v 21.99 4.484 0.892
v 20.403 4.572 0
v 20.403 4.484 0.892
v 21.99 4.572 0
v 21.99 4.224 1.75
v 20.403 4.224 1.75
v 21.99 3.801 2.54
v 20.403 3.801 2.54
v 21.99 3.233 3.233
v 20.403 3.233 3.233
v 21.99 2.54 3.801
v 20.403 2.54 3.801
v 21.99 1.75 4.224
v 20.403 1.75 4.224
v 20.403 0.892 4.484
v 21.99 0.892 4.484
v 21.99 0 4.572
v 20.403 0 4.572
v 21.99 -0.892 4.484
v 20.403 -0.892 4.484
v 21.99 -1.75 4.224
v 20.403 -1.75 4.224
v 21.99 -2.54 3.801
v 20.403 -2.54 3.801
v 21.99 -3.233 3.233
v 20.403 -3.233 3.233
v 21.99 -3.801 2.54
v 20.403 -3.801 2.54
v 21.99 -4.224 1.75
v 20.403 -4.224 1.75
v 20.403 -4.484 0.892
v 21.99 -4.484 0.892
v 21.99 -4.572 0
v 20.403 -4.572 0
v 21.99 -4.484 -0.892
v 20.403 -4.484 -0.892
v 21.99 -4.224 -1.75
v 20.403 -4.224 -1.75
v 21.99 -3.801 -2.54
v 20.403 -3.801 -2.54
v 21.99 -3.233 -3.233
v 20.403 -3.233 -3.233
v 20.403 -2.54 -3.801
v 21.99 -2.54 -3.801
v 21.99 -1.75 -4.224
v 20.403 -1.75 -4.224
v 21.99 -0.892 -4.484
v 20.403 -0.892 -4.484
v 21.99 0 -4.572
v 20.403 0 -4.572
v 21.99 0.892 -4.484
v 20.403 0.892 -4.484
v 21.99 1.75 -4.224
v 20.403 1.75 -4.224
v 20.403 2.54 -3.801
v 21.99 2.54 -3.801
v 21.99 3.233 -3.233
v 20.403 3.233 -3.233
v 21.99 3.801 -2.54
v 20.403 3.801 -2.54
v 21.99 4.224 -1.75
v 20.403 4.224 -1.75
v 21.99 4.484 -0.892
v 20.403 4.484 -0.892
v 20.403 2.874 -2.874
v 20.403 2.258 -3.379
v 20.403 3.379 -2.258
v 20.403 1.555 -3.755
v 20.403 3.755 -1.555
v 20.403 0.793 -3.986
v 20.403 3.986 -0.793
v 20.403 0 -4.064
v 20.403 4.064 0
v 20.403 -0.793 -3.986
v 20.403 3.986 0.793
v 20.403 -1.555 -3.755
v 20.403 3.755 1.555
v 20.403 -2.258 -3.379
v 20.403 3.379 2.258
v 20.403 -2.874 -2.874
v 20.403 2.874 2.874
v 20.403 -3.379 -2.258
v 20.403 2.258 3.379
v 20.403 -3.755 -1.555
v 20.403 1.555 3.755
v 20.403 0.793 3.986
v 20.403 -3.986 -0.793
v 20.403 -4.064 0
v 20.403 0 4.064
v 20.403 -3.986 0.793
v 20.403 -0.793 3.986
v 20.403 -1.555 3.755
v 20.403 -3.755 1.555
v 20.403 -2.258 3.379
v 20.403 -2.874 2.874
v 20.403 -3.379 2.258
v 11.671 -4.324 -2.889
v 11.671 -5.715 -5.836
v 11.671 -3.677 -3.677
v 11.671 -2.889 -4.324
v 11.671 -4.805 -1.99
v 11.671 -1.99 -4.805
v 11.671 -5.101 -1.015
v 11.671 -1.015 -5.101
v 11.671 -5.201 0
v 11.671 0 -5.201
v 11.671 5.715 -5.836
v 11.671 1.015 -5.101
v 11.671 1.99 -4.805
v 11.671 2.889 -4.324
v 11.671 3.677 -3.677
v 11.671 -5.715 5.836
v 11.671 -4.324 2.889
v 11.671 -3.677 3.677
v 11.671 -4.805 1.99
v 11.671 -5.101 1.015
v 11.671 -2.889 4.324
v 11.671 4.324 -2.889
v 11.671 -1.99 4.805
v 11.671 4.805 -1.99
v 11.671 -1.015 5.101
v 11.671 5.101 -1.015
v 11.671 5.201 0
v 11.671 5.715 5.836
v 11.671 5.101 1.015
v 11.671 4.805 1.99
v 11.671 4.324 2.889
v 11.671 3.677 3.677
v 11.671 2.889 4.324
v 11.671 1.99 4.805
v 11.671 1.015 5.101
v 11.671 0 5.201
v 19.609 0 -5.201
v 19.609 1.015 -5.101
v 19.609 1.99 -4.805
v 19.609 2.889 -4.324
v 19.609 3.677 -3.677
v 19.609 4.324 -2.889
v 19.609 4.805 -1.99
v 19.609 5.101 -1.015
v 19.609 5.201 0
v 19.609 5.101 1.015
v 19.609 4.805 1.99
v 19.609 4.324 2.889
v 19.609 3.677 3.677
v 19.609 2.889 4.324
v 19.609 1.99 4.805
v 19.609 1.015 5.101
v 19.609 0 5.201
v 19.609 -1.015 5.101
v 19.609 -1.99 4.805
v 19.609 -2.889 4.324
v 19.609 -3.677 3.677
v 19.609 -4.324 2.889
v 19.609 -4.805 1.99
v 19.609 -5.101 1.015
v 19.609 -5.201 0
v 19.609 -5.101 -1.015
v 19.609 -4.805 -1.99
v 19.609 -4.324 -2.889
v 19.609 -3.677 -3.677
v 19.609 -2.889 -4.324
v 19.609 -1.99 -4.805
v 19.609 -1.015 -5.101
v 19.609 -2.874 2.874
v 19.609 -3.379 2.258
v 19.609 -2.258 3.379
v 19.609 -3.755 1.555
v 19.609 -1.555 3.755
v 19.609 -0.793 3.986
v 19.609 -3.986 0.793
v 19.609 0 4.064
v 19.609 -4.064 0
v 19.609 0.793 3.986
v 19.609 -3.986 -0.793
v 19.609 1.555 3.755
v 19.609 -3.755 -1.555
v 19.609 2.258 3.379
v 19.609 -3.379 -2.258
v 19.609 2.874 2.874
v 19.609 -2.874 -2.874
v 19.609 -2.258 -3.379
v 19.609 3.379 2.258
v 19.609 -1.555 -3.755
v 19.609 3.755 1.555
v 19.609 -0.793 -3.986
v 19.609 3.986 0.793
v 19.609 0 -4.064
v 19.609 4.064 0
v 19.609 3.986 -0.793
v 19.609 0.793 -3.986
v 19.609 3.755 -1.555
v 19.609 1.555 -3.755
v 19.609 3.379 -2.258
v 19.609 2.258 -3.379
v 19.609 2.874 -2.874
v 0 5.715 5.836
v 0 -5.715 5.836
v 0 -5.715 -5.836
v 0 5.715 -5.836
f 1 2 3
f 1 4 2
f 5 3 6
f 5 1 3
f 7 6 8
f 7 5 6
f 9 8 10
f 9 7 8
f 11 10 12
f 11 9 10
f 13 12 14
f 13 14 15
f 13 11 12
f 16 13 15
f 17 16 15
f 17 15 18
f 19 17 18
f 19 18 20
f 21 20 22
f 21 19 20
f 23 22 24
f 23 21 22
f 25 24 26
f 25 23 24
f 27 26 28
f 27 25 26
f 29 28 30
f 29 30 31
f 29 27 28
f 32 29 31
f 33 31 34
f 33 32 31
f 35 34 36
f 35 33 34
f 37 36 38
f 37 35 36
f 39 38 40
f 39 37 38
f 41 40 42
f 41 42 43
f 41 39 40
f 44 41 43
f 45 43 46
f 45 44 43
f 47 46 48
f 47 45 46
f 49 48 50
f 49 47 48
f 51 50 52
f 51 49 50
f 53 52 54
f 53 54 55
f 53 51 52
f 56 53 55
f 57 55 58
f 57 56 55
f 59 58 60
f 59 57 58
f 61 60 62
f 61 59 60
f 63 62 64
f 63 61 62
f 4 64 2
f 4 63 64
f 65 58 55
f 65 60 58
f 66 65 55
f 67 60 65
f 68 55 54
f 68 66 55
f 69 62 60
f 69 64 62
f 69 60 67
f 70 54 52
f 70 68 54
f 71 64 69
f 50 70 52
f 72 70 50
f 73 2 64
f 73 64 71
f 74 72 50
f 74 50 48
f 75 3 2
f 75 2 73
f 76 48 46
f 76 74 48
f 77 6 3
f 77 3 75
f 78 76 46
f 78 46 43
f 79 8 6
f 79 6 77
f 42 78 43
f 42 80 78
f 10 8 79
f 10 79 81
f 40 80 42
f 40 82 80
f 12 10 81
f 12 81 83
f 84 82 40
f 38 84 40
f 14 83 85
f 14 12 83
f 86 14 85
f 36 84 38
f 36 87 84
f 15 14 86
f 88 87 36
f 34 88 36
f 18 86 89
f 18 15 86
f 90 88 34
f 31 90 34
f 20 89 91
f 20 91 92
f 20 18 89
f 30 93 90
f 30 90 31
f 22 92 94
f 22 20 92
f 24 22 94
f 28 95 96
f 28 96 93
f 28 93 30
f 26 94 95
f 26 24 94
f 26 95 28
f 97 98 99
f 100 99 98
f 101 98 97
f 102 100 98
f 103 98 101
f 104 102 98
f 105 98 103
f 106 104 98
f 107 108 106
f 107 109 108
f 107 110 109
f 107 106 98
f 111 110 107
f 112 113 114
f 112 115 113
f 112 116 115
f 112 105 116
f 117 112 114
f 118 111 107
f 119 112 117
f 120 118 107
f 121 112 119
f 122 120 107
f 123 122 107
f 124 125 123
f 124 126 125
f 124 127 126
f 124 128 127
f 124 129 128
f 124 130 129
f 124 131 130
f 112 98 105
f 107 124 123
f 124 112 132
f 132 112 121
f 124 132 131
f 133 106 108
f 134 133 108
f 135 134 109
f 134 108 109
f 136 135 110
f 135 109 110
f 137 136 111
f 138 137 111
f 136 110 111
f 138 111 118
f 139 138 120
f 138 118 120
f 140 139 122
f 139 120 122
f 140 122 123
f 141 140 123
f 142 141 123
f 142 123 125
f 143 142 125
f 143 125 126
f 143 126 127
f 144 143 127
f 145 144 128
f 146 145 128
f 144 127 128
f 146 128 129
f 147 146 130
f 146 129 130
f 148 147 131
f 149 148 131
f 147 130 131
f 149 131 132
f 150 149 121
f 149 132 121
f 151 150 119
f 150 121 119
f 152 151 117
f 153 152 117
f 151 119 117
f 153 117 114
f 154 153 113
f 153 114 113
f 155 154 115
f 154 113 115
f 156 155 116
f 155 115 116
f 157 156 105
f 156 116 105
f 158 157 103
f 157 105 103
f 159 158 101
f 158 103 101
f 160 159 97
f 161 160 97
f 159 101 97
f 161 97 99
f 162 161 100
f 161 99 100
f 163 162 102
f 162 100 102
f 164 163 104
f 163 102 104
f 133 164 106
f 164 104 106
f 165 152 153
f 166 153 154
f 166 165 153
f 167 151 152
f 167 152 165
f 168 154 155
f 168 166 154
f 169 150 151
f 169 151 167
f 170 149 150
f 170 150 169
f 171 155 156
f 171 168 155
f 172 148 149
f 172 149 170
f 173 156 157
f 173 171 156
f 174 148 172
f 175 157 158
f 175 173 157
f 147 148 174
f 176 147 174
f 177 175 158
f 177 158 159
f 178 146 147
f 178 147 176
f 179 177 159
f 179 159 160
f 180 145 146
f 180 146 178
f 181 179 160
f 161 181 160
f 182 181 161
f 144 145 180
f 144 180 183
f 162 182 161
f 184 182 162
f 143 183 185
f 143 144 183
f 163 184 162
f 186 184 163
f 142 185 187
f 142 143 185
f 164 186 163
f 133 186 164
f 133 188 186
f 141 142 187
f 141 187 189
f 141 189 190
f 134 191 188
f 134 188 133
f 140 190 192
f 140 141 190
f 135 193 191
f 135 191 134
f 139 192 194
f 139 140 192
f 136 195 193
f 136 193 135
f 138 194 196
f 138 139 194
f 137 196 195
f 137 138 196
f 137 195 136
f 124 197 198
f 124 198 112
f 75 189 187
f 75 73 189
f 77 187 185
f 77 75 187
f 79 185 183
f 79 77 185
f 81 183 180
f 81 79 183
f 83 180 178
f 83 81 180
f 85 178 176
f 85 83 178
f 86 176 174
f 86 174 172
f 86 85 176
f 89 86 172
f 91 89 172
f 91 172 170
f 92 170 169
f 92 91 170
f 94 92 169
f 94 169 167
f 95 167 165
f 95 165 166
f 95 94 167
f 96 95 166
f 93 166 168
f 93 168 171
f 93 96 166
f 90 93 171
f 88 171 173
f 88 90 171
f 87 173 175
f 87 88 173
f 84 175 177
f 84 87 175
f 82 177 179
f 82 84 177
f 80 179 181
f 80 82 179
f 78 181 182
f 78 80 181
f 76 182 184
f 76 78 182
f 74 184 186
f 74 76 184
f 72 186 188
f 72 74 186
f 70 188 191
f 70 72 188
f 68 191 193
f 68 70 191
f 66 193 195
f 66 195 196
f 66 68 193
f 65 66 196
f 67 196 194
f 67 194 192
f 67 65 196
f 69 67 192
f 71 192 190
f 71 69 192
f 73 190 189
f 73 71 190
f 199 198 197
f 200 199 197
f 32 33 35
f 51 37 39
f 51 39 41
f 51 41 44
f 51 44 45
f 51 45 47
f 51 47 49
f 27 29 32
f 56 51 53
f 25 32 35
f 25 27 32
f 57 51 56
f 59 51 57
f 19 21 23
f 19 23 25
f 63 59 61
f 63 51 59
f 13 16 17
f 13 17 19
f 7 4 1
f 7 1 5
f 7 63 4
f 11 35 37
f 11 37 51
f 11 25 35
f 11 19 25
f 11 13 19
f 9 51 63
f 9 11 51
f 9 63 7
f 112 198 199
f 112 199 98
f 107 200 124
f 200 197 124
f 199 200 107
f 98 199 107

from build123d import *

# Parameters (mm, degrees)
SKETCH1_W           = 11.6713
SKETCH1_H           = 11.43
EXTRUDE1_DEPTH      = 5.83565
EXTRUDE1_DEPTH_BACK = 5.83565
SKETCH2_R           = 5.20065
EXTRUDE2_DEPTH      = 7.9375


with BuildPart() as part:
    # Sketch1 → Extrude1 (new body, two sides)
    with BuildSketch(Plane.XY) as extrude1_sk:
        with Locations((5.83565, 0)):
            Rectangle(SKETCH1_W, SKETCH1_H)
    extrude(amount=EXTRUDE1_DEPTH)
    extrude(extrude1_sk.sketch, amount=-EXTRUDE1_DEPTH_BACK)

    # Sketch2 → Extrude2 (add)
    with BuildSketch(Plane(origin=(11.6713, 0, 0), x_dir=(0, 0, -1), z_dir=(1, 0, 0))):
        Circle(SKETCH2_R)
    extrude(amount=EXTRUDE2_DEPTH)

    # Sketch3 → Revolve1 (revolve)
    with BuildSketch(Plane.XY):
        Polygon((19.6088, 0), (19.6088, 4.064), (20.40255, 4.064), (20.40255, 4.572), (21.99005, 4.572), (21.99005, 0), align=None)
    revolve(axis=Axis((0, 0, 0), (1, 0, 0)))


solid = part.part
